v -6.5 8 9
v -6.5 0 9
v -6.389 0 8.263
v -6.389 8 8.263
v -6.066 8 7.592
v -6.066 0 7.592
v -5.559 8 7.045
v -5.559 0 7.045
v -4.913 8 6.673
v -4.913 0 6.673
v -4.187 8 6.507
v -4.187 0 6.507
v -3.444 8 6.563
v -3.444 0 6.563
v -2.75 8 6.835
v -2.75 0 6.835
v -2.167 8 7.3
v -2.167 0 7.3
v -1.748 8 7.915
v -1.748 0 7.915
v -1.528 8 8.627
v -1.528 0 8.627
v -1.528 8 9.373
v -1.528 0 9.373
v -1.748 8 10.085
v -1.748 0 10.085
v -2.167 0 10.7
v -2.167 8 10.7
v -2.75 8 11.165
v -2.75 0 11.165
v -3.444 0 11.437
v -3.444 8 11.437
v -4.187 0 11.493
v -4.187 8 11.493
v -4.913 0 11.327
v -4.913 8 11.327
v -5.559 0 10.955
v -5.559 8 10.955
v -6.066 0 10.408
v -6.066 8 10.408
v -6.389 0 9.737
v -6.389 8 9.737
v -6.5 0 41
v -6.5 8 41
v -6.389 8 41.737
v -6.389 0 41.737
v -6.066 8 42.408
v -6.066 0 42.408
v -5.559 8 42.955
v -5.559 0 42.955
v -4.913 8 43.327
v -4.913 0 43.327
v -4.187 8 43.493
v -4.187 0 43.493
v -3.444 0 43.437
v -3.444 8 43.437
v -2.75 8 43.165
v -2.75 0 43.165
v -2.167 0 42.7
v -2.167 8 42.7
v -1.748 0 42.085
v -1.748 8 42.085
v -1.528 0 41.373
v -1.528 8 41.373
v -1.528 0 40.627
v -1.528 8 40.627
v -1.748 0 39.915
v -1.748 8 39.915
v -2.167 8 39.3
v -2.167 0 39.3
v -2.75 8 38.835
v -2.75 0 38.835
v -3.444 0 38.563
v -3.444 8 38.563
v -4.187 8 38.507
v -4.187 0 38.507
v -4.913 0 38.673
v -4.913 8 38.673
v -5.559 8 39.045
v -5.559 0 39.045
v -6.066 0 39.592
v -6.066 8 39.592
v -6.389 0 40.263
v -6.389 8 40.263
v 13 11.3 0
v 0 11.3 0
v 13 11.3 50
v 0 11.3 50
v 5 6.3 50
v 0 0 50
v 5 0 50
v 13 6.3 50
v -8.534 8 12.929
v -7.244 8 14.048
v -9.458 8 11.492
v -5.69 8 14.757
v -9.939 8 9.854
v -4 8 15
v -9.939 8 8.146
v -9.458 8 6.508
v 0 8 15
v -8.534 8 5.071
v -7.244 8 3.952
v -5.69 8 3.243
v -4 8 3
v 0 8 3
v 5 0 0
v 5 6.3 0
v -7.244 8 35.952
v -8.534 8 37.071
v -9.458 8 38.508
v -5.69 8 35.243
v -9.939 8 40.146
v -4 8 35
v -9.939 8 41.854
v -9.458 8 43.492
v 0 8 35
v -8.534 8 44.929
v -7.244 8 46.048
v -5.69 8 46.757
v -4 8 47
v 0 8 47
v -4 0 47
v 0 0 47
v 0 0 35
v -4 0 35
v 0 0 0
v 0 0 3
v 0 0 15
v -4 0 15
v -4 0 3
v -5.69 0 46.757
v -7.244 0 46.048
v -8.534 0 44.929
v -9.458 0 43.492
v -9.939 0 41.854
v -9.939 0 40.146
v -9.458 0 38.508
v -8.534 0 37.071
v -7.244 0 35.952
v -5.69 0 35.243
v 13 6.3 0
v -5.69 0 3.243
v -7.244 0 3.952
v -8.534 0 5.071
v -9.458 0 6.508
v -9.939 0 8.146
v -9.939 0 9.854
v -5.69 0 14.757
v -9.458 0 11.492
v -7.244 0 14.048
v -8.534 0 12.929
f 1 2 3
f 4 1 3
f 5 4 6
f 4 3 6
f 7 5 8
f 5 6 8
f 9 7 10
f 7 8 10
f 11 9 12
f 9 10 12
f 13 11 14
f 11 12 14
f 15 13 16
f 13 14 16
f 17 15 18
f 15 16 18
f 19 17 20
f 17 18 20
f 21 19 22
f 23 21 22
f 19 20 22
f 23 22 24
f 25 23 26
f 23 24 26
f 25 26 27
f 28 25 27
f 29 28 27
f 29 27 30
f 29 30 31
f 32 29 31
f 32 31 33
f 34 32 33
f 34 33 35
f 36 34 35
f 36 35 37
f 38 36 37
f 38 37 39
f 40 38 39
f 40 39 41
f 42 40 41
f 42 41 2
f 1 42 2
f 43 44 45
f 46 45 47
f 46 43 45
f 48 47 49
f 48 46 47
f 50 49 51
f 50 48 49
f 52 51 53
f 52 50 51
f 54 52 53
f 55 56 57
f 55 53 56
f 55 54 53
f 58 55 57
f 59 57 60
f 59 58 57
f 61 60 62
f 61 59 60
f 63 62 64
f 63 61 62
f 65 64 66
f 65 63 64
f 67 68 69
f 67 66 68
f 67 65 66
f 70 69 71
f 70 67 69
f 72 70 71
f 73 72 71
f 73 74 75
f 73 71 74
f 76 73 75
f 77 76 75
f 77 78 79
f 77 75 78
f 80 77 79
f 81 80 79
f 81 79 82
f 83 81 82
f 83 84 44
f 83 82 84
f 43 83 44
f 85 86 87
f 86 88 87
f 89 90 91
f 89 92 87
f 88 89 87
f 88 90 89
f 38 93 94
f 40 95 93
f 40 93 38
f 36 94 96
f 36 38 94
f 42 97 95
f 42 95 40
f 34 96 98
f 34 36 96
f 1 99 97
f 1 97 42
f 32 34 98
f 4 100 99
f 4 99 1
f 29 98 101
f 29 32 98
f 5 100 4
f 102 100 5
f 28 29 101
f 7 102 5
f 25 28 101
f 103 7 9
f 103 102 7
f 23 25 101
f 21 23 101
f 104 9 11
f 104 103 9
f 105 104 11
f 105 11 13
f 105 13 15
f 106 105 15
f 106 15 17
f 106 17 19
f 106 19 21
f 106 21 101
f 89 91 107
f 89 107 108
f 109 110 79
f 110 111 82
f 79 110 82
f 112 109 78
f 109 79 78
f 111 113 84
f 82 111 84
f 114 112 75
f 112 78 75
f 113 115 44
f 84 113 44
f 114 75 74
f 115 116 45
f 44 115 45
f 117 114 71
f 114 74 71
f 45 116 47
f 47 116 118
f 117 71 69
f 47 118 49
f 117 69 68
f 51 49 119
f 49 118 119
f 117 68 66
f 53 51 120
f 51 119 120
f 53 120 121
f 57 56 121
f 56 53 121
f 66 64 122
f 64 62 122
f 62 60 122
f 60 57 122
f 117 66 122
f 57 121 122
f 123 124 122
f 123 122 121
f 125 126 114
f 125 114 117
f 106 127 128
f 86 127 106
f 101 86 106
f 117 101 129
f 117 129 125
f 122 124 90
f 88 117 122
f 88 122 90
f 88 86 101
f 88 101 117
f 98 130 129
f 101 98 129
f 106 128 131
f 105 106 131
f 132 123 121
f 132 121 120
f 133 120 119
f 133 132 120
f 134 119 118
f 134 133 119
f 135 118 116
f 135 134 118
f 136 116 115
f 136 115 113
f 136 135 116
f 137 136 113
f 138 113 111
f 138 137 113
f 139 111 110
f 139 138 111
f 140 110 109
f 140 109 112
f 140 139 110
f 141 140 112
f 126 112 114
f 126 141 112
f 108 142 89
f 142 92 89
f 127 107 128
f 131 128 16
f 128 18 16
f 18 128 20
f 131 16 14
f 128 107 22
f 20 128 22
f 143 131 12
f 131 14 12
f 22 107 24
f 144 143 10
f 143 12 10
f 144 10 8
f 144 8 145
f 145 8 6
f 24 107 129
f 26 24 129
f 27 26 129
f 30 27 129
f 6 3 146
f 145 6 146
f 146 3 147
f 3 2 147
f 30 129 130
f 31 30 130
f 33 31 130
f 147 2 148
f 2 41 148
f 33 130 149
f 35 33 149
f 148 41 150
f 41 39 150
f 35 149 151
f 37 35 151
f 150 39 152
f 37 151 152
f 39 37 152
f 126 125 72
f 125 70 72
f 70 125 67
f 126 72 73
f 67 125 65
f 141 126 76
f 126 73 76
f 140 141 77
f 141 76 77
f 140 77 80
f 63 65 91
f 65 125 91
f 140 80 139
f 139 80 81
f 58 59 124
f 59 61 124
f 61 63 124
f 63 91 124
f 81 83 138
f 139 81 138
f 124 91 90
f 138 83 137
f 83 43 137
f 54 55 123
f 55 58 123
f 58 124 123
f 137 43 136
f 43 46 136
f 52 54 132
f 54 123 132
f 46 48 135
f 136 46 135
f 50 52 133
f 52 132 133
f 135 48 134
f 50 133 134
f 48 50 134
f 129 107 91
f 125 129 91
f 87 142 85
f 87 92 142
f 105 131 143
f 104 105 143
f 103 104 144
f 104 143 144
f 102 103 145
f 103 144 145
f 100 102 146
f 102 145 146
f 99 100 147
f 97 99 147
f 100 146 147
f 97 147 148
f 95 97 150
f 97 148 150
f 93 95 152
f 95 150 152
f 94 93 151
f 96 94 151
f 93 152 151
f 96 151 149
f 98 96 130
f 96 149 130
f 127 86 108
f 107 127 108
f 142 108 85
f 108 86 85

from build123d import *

# Parameters (mm, degrees)
CROQUIS4_W                = 13
CROQUIS4_H                = 11.3
SALIENTE_EXTRUIR1_DEPTH   = 161
CROQUIS5_W                = 151
CROQUIS5_H                = 3.5
CORTAR_EXTRUIR1_DEPTH     = 6.3
SALIENTE_EXTRUIR3_DEPTH   = 8
CROQUIS9_R                = 2.5
CORTAR_EXTRUIR3_DEPTH     = 179.518038304
SIMETR_A8_COPY_1_DEPTH    = 8
SIMETR_A8_COPY_2_SKETCH_R = 2.5
SIMETR_A8_COPY_2_DEPTH    = 179.518038304
CROQUIS10_R               = 2.5
CORTAR_EXTRUIR4_DEPTH     = 179.518038304
MATRIZL1_COUNT            = 3
MATRIZL1_PITCH            = 40.5
CROQUIS11_W               = 64.853728184
CROQUIS11_H               = 22.965019475
CORTAR_EXTRUIR5_DEPTH     = 167.107465215
CROQUIS12_W               = 8
CROQUIS12_H               = 6.3
CORTAR_EXTRUIR6_DEPTH     = 45.010680522


with BuildPart() as part:
    # Barrer1: sweep along a path in Croquis3
    with BuildLine(Plane(origin=(0, 0, 0), x_dir=(1, 0, 0), z_dir=(0, 1, 0))) as barrer1_path:
        Line((0, 0), (0, -37))
    # Croquis1 → Barrer1 (sweep)
    with BuildSketch(Plane.XY):
        Polygon((0, 0), (0, 11.3), (13, 11.3), (13, 6.3), (5, 6.3), (5, 0), align=None)
    barrer1 = sweep(path=barrer1_path.line)

    # Croquis4 → Saliente-Extruir1 (add)
    with BuildSketch(Plane.ZY):
        with Locations((43.5, 5.65)):
            Rectangle(CROQUIS4_W, CROQUIS4_H)
    extrude(amount=-SALIENTE_EXTRUIR1_DEPTH)

    # Simetría5: Barrer1 across plane
    add(barrer1.mirror(Plane.ZY.offset(-80.5)))

    # Croquis5 → Cortar-Extruir1 (cut)
    with BuildSketch(Plane.XZ):
        with Locations((80.5, 38.75)):
            Rectangle(CROQUIS5_W, CROQUIS5_H)
    extrude(amount=-CORTAR_EXTRUIR1_DEPTH, mode=Mode.SUBTRACT)

    # Croquis8 → Saliente-Extruir3 (add)
    with BuildSketch(Plane.XZ):
        with BuildLine():
            Line((161, 47), (165, 47))
            ThreePointArc((165, 47), (171, 41), (165, 35))
            Line((165, 35), (161, 35))
            Line((161, 35), (161, 47))
        make_face()
    saliente_extruir3 = extrude(amount=-SALIENTE_EXTRUIR3_DEPTH)

    # Croquis9 → Cortar-Extruir3 (cut, through all)
    with BuildSketch(Plane.XZ):
        with Locations((165, 41)):
            Circle(CROQUIS9_R)
    cortar_extruir3 = extrude(amount=-CORTAR_EXTRUIR3_DEPTH, mode=Mode.SUBTRACT)

    # Simetría7: Saliente-Extruir3, Cortar-Extruir3 across plane
    add(saliente_extruir3.mirror(Plane(origin=(0, 0, 25), x_dir=(1, 0, 0), z_dir=(0, 0, -1))))
    add(cortar_extruir3.mirror(Plane(origin=(0, 0, 25), x_dir=(1, 0, 0), z_dir=(0, 0, -1))), mode=Mode.SUBTRACT)

    # Simetría8: Saliente-Extruir3, Cortar-Extruir3 across plane
    add(saliente_extruir3.mirror(Plane.ZY.offset(-80.5)))
    add(cortar_extruir3.mirror(Plane.ZY.offset(-80.5)), mode=Mode.SUBTRACT)

    # Simetría8 copy 1 sketch → Simetría8 copy 1 (add)
    with BuildSketch(Plane(origin=(161, 0, 50), x_dir=(-1, 0, 0), z_dir=(0, -1, 0))):
        with BuildLine():
            Line((161, 47), (165, 47))
            ThreePointArc((165, 47), (171, 41), (165, 35))
            Line((165, 35), (161, 35))
            Line((161, 35), (161, 47))
        make_face()
    extrude(amount=-SIMETR_A8_COPY_1_DEPTH)

    # Simetría8 copy 2 sketch → Simetría8 copy 2 (cut, through all)
    with BuildSketch(Plane(origin=(161, 0, 50), x_dir=(-1, 0, 0), z_dir=(0, -1, 0))):
        with Locations((165, 41)):
            Circle(SIMETR_A8_COPY_2_SKETCH_R)
    extrude(amount=-SIMETR_A8_COPY_2_DEPTH, mode=Mode.SUBTRACT)

    # Croquis10 → Cortar-Extruir4 (cut, through all)
    with BuildSketch(Plane(origin=(0, 11.3, 0), x_dir=(1, 0, 0), z_dir=(0, 1, 0))):
        with Locations(Location((121, -45.25, 0), (0, 0, 270))):
            Circle(CROQUIS10_R)
    cortar_extruir4 = extrude(amount=-CORTAR_EXTRUIR4_DEPTH, mode=Mode.SUBTRACT)

    # MatrizL1: Cortar-Extruir4 ×3
    with Locations(*[(-i * MATRIZL1_PITCH, 0, 0) for i in range(1, MATRIZL1_COUNT)]):
        add(cortar_extruir4, mode=Mode.SUBTRACT)

    # Croquis11 → Cortar-Extruir5 (cut, through all)
    with BuildSketch(Plane(origin=(13, 0, 0), x_dir=(0, 0, -1), z_dir=(1, 0, 0))):
        with Locations((-26.956517022, 7.895183468)):
            Rectangle(CROQUIS11_W, CROQUIS11_H)
    extrude(amount=CORTAR_EXTRUIR5_DEPTH, mode=Mode.SUBTRACT)

    # Croquis12 → Cortar-Extruir6 (cut, through all)
    with BuildSketch(Plane(origin=(0, 0, 40.5), x_dir=(-1, 0, 0), z_dir=(0, 0, -1))):
        with Locations((-9, 3.15)):
            Rectangle(CROQUIS12_W, CROQUIS12_H)
    extrude(amount=-CORTAR_EXTRUIR6_DEPTH, mode=Mode.SUBTRACT)


solid = part.part
